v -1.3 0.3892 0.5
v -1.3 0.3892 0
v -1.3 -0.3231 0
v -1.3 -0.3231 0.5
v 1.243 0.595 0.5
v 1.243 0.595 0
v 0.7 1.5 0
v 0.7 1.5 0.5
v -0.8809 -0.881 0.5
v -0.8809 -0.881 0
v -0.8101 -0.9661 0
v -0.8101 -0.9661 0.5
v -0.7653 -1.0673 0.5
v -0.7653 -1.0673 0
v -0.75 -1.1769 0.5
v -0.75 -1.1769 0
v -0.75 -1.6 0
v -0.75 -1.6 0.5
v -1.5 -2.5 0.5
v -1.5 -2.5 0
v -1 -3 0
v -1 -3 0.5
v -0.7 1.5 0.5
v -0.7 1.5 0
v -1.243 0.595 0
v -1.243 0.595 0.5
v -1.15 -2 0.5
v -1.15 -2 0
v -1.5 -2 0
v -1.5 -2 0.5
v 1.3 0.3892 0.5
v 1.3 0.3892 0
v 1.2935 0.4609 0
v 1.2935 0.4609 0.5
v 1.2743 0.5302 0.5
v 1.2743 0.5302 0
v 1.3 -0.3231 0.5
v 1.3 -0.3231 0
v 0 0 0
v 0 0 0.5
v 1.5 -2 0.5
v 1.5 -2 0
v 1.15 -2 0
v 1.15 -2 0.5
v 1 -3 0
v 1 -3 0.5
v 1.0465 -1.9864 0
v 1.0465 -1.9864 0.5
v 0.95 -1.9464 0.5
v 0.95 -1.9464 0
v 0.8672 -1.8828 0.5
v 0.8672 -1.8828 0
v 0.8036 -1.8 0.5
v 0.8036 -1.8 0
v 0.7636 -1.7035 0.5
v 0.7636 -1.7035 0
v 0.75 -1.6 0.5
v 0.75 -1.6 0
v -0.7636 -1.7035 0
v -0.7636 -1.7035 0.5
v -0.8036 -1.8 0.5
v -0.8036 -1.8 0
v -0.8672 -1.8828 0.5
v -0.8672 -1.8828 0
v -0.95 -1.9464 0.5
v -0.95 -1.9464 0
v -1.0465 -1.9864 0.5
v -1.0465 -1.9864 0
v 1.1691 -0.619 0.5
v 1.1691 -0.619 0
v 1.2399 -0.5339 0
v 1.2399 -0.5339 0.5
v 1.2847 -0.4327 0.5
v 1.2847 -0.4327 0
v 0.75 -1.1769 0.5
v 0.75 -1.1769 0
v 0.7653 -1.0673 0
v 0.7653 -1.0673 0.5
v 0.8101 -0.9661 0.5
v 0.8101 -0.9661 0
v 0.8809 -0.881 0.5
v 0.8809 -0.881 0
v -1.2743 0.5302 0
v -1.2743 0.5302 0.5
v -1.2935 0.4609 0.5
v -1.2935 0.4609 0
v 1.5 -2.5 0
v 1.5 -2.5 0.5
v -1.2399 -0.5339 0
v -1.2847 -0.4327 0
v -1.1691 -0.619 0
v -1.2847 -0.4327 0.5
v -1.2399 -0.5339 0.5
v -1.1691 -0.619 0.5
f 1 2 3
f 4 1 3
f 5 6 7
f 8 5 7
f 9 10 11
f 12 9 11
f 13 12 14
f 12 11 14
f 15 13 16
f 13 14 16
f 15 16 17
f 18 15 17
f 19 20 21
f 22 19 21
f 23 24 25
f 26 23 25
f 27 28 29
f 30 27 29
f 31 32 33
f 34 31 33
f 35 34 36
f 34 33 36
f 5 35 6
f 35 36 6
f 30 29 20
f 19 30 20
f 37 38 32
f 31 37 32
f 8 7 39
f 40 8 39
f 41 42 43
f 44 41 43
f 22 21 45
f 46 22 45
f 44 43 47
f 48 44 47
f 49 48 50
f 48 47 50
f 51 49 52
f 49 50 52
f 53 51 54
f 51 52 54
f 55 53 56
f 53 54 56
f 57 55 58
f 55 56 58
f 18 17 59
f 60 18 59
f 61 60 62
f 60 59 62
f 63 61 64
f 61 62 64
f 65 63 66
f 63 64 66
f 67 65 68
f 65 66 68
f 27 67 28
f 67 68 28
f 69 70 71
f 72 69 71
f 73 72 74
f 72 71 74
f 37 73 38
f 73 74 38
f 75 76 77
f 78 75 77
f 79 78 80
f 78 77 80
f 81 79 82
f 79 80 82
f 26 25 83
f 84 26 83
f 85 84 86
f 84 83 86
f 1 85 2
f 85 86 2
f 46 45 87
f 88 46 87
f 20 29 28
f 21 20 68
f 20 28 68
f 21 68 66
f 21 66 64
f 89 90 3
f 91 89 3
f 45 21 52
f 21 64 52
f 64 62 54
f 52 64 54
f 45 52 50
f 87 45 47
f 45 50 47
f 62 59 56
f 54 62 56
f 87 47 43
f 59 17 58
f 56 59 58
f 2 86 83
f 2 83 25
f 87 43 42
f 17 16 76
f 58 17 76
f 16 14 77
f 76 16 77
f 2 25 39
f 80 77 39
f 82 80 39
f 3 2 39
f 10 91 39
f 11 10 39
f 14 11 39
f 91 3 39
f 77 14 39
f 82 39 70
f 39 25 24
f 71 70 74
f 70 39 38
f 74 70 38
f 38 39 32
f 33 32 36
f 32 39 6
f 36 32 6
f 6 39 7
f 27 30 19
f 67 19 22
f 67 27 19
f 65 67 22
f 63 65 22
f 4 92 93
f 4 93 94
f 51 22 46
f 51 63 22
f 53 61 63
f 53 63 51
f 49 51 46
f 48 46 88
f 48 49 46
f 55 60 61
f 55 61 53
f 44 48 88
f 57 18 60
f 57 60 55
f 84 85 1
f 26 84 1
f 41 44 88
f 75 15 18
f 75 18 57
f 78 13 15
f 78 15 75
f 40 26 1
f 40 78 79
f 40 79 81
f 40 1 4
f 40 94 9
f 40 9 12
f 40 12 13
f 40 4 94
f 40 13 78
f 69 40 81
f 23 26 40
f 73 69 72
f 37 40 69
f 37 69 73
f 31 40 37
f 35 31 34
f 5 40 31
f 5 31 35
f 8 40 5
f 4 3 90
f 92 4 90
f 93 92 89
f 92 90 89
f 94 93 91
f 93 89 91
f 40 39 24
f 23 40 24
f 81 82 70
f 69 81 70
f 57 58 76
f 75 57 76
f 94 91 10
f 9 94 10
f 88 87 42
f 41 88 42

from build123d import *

# Parameters (mm, degrees)
ESTRUSIONE_ESTRUSIONE1_DEPTH = 0.5


with BuildPart() as part:
    # Schizzo1 → Estrusione-Estrusione1 (new body)
    with BuildSketch(Plane.XY):
        with BuildLine():
            Line((-1, -3), (1, -3))
            Line((1, -3), (1.5, -2.5))
            Line((1.5, -2.5), (1.5, -2))
            Line((1.5, -2), (1.15, -2))
            ThreePointArc((1.15, -2), (0.867157288, -1.882842712), (0.75, -1.6))
            Line((0.75, -1.6), (0.75, -1.176947954))
            ThreePointArc((0.75, -1.176947954), (0.784194282, -1.015126521), (0.880930882, -0.880971925))
            Line((0.880930882, -0.880971925), (1.169069118, -0.619028075))
            ThreePointArc((1.169069118, -0.619028075), (1.265805718, -0.484873479), (1.3, -0.323052046))
            Line((1.3, -0.323052046), (1.3, 0.389206414))
            ThreePointArc((1.3, 0.389206414), (1.285485971, 0.495979847), (1.24299717, 0.595004716))
            Line((1.24299717, 0.595004716), (0.7, 1.5))
            Line((0.7, 1.5), (0, 0))
            Line((0, 0), (-0.7, 1.5))
            Line((-0.7, 1.5), (-1.24299717, 0.595004716))
            ThreePointArc((-1.24299717, 0.595004716), (-1.285485971, 0.495979847), (-1.3, 0.389206414))
            Line((-1.3, 0.389206414), (-1.3, -0.323052046))
            ThreePointArc((-1.3, -0.323052046), (-1.265805718, -0.484873479), (-1.169069118, -0.619028075))
            Line((-1.169069118, -0.619028075), (-0.880930882, -0.880971925))
            ThreePointArc((-0.880930882, -0.880971925), (-0.784194282, -1.015126521), (-0.75, -1.176947954))
            Line((-0.75, -1.176947954), (-0.75, -1.6))
            ThreePointArc((-0.75, -1.6), (-0.867157288, -1.882842712), (-1.15, -2))
            Line((-1.15, -2), (-1.5, -2))
            Line((-1.5, -2), (-1.5, -2.5))
            Line((-1.5, -2.5), (-1, -3))
        make_face()
    extrude(amount=ESTRUSIONE_ESTRUSIONE1_DEPTH)


solid = part.part
